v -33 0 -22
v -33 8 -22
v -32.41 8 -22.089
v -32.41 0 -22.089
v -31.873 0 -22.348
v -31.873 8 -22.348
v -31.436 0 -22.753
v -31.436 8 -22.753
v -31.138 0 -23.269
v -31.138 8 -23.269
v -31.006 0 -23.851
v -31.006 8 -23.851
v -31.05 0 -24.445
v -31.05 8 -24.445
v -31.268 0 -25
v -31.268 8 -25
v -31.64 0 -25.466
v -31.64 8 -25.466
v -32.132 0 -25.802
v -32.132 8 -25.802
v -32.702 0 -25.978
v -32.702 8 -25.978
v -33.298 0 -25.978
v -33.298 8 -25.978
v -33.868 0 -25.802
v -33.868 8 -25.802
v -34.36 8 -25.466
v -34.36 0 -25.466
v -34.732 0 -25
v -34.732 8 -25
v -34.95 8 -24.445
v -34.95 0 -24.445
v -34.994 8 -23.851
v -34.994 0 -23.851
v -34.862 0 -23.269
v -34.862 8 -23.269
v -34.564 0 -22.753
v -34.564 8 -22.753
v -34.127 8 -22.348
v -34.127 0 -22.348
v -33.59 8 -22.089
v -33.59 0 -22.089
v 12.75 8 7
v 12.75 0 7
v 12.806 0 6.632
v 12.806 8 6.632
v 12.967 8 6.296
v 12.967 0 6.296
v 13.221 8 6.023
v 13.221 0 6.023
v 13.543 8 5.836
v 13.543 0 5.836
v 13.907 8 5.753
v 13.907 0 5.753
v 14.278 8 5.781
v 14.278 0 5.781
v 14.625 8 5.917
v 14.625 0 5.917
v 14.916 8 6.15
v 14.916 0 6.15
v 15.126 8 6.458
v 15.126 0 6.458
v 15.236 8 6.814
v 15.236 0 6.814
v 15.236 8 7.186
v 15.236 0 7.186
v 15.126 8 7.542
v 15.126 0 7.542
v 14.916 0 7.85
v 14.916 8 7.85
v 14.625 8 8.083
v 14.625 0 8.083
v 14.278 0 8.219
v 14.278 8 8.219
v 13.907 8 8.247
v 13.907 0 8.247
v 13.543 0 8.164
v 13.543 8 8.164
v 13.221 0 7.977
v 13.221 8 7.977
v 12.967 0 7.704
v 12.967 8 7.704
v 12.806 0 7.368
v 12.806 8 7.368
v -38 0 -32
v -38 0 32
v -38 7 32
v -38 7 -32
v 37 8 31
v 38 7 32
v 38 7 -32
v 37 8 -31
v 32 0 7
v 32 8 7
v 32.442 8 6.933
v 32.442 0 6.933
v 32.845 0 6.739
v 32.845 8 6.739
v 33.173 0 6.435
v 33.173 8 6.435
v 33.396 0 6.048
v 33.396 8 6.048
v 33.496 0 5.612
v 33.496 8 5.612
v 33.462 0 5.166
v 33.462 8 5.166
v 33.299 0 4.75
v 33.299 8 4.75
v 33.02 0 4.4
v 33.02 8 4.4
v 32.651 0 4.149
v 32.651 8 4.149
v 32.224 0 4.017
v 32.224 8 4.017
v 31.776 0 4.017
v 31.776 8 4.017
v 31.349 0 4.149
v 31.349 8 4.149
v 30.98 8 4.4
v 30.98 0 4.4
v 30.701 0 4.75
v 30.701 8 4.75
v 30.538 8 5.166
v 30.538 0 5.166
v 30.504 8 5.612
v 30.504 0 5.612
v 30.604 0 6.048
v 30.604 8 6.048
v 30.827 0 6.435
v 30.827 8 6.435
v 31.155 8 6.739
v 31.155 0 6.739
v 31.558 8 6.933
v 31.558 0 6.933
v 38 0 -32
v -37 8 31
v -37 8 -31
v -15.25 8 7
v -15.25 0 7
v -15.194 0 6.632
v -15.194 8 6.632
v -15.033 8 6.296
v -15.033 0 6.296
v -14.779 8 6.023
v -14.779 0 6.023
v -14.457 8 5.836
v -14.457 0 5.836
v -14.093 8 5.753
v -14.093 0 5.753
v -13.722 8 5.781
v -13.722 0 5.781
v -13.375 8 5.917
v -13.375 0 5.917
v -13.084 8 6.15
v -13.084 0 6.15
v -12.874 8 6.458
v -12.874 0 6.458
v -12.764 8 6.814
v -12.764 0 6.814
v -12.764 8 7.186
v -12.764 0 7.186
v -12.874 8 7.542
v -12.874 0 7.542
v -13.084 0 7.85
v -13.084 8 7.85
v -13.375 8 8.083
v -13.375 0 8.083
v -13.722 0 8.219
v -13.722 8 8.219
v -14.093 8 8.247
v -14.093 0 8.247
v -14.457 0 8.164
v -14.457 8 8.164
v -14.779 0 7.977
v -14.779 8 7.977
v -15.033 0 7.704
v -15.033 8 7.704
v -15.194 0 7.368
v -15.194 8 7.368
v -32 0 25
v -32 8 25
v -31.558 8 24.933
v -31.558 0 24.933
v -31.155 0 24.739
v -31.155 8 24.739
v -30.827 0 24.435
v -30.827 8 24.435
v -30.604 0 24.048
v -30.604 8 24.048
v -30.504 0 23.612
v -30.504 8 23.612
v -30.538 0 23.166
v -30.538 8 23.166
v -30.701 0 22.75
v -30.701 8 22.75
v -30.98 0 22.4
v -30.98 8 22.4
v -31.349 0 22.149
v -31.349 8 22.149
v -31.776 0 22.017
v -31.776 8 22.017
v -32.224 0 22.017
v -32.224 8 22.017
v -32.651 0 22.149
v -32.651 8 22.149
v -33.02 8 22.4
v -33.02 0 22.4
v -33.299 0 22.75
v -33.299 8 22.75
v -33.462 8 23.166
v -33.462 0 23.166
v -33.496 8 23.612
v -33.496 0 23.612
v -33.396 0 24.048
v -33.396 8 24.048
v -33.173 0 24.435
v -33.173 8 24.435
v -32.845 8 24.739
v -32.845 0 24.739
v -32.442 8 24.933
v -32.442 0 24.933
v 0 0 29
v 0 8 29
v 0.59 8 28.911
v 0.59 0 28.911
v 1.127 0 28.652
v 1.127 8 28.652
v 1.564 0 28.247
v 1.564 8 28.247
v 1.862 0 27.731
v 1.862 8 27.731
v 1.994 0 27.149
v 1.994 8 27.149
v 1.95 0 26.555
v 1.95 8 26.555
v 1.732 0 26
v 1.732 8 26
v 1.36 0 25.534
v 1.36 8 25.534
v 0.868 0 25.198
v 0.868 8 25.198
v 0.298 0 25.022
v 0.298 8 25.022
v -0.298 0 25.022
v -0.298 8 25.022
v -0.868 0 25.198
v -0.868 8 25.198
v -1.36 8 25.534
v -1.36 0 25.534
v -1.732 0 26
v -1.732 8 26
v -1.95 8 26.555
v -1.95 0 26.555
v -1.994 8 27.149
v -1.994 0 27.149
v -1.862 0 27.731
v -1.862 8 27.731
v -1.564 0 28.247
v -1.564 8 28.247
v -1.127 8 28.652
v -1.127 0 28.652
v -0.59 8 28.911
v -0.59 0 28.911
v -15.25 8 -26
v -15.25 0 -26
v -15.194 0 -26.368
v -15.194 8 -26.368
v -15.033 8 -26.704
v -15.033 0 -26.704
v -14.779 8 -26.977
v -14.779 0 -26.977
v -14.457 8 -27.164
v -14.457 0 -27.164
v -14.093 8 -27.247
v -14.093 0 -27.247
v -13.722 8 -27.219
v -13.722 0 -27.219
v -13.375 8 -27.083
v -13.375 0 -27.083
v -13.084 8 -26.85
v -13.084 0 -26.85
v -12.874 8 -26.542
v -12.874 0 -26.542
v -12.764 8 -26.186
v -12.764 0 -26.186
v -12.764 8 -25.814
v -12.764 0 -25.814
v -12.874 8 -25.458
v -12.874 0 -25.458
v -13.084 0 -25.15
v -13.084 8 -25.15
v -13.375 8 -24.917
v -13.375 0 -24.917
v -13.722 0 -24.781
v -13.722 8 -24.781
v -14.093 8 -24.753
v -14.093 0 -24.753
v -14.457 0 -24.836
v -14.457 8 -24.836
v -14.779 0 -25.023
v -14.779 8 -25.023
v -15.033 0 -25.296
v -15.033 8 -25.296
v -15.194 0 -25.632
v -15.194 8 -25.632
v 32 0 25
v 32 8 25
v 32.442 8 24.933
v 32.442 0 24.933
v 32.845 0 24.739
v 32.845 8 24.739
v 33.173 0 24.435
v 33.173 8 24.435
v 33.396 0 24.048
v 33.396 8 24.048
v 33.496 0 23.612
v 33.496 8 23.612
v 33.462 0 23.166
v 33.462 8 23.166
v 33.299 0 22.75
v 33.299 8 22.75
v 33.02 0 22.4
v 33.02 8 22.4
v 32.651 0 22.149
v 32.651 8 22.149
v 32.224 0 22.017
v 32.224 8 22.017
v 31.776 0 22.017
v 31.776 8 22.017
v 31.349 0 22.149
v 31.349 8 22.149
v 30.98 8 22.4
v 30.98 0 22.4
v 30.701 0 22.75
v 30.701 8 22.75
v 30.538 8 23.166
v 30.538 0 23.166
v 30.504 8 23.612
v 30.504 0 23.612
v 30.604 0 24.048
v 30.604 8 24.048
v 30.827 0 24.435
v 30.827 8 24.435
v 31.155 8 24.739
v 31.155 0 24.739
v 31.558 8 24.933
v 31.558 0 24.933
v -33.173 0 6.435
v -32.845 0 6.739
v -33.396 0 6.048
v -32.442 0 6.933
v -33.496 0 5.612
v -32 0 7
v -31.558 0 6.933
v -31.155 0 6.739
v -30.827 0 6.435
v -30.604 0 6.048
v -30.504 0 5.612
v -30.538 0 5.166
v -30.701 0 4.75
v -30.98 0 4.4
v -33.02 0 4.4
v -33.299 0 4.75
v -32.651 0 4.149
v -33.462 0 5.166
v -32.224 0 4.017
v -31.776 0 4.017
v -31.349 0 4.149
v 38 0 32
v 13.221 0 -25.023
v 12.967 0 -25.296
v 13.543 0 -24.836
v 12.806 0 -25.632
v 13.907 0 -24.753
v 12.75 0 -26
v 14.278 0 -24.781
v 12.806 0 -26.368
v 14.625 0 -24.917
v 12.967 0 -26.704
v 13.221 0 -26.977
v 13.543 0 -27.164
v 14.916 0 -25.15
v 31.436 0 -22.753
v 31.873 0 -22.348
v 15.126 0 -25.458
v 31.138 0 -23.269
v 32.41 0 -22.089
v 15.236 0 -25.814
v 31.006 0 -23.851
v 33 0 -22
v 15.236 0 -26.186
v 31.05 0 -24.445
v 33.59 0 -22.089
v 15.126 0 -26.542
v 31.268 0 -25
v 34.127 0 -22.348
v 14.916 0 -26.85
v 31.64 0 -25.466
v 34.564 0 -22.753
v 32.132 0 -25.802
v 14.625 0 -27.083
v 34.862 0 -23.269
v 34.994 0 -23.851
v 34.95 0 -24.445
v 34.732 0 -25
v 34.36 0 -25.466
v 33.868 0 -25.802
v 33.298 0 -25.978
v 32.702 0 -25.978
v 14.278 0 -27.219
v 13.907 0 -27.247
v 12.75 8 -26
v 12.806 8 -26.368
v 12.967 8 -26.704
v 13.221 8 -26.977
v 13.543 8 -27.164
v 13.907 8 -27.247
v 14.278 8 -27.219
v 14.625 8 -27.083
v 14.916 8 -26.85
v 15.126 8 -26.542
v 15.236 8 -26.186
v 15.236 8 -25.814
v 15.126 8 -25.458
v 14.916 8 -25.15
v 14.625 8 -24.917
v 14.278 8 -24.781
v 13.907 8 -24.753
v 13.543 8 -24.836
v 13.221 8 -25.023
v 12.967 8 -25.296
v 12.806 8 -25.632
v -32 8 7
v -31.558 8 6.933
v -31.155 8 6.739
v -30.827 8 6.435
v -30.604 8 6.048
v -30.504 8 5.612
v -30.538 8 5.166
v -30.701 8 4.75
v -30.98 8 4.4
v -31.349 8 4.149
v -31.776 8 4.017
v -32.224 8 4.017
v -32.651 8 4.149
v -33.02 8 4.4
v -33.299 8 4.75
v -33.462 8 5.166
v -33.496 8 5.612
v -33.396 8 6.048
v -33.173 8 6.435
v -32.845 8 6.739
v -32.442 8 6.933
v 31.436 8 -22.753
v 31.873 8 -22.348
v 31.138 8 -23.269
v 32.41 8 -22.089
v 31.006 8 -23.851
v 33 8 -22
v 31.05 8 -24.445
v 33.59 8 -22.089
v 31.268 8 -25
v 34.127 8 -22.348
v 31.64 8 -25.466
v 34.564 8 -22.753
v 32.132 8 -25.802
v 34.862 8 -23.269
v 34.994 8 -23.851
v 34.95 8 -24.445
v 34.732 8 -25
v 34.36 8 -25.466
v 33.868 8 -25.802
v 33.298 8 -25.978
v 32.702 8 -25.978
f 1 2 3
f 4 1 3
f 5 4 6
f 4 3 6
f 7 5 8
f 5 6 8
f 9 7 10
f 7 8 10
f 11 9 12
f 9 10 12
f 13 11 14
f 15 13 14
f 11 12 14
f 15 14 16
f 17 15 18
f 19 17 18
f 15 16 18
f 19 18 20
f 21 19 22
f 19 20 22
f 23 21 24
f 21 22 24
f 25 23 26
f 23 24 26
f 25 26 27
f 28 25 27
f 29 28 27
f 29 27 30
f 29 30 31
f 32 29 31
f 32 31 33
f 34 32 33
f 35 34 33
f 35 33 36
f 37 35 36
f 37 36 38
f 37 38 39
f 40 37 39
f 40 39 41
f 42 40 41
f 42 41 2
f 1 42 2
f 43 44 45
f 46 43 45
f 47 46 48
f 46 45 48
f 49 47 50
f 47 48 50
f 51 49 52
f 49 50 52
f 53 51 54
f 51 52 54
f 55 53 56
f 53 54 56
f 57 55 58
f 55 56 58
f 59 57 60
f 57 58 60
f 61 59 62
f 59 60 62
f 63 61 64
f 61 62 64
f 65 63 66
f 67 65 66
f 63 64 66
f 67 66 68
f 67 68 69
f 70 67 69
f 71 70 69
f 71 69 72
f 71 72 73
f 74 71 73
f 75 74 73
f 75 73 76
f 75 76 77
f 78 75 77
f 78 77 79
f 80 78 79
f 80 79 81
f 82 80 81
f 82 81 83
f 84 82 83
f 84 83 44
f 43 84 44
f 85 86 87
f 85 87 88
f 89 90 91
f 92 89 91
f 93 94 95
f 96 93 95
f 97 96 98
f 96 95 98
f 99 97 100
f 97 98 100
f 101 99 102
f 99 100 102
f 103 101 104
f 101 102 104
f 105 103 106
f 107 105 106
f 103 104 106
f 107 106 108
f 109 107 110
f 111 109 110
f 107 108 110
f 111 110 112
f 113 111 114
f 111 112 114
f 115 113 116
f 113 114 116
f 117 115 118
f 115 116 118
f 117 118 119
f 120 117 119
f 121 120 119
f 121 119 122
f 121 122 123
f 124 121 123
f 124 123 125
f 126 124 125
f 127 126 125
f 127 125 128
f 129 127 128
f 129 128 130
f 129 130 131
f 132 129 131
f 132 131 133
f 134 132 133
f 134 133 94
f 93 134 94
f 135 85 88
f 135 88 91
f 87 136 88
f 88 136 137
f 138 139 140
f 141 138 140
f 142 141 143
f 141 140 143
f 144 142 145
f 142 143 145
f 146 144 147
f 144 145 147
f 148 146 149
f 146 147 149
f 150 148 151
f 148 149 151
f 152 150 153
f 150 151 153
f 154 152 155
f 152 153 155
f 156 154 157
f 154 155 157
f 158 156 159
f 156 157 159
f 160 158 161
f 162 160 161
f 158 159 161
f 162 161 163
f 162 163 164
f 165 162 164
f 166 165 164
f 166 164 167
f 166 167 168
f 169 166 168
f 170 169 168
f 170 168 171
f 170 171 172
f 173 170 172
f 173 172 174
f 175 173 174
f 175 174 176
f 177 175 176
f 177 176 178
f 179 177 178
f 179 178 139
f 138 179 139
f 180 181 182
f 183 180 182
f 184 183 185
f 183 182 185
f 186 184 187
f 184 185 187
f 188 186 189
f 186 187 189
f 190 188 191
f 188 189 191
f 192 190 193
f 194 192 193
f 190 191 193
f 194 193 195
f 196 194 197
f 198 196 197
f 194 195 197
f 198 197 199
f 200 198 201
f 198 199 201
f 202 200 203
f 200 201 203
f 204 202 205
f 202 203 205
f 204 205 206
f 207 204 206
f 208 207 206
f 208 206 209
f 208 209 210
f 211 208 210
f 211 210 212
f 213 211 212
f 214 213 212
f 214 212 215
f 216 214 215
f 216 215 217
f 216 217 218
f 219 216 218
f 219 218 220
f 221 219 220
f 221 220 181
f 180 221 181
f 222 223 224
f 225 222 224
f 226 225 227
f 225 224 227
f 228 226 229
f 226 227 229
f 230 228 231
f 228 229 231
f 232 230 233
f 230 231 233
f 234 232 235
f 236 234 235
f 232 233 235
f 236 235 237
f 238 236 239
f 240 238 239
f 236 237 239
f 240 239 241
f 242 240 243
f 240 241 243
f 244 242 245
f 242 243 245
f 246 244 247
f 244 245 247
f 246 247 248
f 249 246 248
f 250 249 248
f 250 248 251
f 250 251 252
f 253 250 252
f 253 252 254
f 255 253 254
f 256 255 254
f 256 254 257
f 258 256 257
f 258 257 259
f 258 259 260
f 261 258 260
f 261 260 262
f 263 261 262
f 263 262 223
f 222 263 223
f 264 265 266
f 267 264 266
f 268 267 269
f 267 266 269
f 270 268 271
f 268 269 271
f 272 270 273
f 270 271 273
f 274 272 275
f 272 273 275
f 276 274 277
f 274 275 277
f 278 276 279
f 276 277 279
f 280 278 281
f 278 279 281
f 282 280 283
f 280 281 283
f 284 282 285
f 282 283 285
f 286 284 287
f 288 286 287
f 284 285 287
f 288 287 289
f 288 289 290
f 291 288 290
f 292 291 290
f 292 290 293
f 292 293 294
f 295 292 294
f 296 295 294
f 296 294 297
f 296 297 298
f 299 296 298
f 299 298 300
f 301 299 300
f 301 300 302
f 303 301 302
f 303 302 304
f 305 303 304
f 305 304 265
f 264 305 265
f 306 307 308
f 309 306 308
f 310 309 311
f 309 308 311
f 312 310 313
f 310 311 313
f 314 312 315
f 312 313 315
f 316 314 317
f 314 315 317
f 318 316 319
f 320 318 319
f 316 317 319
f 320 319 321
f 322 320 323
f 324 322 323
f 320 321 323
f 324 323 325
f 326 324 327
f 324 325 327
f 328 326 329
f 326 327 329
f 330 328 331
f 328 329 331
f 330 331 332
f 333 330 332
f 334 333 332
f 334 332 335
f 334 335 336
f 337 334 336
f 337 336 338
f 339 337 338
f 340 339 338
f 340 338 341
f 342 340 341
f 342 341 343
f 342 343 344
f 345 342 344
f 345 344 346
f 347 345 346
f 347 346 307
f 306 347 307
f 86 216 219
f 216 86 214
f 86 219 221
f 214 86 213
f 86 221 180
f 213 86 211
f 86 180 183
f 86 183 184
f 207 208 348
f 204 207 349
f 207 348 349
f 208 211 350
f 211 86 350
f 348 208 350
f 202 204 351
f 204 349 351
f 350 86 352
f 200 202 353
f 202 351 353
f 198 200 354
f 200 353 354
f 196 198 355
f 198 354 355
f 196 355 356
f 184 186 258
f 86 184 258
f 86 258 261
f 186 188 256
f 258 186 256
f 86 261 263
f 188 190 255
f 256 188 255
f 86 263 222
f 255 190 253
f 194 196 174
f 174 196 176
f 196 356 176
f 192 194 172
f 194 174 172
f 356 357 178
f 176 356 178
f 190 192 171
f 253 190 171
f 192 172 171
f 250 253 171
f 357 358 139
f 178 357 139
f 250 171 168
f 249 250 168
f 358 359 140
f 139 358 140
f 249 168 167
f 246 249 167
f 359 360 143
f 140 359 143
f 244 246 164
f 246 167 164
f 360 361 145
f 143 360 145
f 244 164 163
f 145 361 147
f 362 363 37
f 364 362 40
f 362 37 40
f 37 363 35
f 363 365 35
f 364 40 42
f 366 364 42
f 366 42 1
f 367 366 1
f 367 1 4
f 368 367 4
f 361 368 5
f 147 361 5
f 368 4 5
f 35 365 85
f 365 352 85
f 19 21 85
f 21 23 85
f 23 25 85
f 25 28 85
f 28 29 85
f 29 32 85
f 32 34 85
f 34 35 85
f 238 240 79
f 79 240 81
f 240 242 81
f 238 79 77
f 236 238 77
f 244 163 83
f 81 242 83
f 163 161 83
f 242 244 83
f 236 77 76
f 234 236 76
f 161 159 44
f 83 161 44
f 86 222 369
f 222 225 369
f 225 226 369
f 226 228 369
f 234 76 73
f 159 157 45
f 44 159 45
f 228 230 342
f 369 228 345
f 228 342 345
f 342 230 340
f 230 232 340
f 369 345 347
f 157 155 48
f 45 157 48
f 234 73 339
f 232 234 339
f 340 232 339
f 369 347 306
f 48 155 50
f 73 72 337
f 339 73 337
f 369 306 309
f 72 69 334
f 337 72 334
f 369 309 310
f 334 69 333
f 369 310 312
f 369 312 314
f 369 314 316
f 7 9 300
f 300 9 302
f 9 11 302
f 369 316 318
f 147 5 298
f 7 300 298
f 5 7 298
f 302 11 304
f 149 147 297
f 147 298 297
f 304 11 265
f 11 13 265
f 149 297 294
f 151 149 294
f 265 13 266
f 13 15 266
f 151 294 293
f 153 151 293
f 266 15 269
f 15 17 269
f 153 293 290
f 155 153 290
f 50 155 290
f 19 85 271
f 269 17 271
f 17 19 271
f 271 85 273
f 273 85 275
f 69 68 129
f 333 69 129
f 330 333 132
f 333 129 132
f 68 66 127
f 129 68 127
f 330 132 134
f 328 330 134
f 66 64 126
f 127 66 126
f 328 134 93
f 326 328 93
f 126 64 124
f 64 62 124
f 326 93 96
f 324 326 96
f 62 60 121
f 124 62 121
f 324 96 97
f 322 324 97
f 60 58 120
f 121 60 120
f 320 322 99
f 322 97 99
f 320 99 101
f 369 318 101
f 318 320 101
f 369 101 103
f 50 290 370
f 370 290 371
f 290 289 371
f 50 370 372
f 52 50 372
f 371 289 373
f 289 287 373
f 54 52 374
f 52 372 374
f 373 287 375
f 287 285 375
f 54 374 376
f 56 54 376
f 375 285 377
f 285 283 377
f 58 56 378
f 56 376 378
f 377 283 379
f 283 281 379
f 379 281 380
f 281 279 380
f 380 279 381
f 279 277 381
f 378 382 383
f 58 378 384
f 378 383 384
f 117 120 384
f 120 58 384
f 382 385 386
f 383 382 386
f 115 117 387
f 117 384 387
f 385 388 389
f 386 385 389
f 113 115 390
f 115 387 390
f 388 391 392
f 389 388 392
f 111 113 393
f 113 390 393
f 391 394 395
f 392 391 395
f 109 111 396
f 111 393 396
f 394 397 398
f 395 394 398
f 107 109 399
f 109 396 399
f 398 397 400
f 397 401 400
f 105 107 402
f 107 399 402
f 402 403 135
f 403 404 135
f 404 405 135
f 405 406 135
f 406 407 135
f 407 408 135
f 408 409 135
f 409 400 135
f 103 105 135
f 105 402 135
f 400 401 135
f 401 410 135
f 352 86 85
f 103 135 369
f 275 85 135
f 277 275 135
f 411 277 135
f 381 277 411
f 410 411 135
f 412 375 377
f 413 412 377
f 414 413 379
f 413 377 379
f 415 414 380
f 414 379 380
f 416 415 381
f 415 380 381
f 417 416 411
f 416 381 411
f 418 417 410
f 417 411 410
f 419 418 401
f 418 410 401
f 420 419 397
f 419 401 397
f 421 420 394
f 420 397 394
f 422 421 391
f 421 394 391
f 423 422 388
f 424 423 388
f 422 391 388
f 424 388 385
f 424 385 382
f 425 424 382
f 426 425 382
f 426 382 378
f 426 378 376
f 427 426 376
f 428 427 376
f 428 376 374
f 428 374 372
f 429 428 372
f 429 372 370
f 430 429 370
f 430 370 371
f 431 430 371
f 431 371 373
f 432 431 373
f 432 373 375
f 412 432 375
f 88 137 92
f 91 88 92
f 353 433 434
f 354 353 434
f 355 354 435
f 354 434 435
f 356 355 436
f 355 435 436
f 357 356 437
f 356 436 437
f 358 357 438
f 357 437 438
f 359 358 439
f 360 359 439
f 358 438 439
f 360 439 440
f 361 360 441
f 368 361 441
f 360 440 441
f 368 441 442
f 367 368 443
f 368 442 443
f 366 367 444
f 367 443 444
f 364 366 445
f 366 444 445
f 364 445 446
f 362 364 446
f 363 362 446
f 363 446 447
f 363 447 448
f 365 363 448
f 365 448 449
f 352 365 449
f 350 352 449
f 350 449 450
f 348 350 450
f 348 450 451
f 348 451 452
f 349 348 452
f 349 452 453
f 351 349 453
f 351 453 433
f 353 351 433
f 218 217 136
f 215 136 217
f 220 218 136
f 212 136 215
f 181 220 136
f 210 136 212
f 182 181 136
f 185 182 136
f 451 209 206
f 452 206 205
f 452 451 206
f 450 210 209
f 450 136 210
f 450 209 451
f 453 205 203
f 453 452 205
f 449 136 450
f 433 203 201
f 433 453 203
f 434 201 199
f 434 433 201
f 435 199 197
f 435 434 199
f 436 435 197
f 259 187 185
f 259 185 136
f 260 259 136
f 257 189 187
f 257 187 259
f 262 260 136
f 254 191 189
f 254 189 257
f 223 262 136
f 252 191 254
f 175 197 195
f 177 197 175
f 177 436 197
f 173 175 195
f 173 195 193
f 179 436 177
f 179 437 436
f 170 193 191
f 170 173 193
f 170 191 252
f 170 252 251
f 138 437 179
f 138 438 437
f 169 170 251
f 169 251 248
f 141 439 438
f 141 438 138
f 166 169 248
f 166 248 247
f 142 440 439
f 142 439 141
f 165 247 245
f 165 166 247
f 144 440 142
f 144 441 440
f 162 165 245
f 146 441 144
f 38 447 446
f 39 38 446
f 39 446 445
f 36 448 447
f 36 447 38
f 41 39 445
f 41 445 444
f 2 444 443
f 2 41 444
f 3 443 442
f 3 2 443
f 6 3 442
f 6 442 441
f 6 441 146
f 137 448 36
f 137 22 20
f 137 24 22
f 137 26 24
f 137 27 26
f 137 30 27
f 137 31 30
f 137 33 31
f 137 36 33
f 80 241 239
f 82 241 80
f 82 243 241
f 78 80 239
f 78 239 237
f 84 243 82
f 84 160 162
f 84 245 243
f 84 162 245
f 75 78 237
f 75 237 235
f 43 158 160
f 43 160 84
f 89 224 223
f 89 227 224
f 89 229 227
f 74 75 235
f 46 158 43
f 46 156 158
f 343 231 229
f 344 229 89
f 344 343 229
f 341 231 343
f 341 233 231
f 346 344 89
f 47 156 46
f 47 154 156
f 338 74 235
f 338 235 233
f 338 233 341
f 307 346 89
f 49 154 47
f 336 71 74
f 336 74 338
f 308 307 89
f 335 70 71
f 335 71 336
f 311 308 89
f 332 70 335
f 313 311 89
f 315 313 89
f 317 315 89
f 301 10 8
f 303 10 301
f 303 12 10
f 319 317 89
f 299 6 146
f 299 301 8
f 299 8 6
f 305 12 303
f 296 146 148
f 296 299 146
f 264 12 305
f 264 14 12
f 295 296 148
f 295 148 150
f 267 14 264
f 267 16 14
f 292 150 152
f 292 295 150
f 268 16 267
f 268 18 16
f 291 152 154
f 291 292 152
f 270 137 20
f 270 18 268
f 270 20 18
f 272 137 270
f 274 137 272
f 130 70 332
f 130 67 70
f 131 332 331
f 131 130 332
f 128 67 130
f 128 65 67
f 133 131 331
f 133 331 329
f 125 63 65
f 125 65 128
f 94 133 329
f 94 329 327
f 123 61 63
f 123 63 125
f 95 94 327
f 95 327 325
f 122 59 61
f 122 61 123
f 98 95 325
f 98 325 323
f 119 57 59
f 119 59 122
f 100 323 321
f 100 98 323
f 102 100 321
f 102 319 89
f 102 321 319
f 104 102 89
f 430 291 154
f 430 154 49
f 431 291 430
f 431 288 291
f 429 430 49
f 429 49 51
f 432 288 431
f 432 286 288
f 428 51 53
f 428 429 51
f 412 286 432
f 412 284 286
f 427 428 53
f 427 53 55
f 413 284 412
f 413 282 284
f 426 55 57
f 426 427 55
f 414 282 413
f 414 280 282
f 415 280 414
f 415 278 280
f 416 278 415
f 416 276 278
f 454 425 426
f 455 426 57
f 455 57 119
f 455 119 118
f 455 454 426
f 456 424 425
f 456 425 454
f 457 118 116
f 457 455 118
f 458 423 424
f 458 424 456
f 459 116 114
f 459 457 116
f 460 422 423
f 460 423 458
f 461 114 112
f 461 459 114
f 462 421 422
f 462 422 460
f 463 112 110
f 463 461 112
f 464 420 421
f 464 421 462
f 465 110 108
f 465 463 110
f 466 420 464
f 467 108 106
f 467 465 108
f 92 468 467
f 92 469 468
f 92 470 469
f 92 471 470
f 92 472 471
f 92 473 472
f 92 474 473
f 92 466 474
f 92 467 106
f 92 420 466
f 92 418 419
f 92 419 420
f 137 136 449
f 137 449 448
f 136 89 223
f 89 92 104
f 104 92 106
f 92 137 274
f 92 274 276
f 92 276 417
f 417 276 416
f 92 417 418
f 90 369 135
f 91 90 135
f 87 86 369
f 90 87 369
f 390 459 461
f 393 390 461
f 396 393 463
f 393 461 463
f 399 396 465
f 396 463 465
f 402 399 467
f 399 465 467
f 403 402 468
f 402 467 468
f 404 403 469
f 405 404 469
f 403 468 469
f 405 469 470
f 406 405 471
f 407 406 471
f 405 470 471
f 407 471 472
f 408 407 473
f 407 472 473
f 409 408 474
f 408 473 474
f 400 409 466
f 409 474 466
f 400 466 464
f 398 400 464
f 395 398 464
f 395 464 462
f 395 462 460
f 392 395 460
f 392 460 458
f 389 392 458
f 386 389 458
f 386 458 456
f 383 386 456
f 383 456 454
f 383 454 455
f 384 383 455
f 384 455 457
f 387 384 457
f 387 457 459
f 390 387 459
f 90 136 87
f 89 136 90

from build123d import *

# Parameters (mm, degrees)
SKETCH1_W            = 76
SKETCH1_H            = 64
BOSS_EXTRUDE1_DEPTH  = 8
M3_TAPPED_HOLE1_D    = 2.5
LPATTERN2_COUNT      = 2
LPATTERN2_PITCH      = 28
LPATTERN2_COUNT_DIR2 = 2
LPATTERN2_PITCH_DIR2 = 33
SKETCH5_R            = 2
CUT_EXTRUDE1_DEPTH   = 51.318982502
CHAMFER1_SIZE        = 1
SKETCH6_R            = 1.5
CUT_EXTRUDE2_DEPTH   = 10


with BuildPart() as part:
    # Sketch1 → Boss-Extrude1 (new body)
    with BuildSketch(Plane(origin=(0, 0, 0), x_dir=(1, 0, 0), z_dir=(0, 1, 0))):
        Rectangle(SKETCH1_W, SKETCH1_H)
    extrude(amount=BOSS_EXTRUDE1_DEPTH)

    # M3 Tapped Hole1 (through all)
    with Locations(Plane(origin=(0, 8, 0), x_dir=(1, 0, 0), z_dir=(0, 1, 0))):
        with Locations((-14, 26)):
            m3_tapped_hole1 = Hole(M3_TAPPED_HOLE1_D / 2)

    # LPattern2: M3 Tapped Hole1 2 × 2
    with Locations(*[(i * LPATTERN2_PITCH, 0, j * LPATTERN2_PITCH_DIR2) for i in range(LPATTERN2_COUNT) for j in range(LPATTERN2_COUNT_DIR2) if (i, j) != (0, 0)]):
        add(m3_tapped_hole1, mode=Mode.SUBTRACT)

    # Sketch5 → Cut-Extrude1 (cut, through all)
    with BuildSketch(Plane(origin=(0, 8, 0), x_dir=(1, 0, 0), z_dir=(0, 1, 0))):
        with Locations(Location((-33, 24, 0), (0, 0, 270))):
            Circle(SKETCH5_R)
        with Locations(Location((33, 24, 0), (0, 0, 270))):
            Circle(SKETCH5_R)
        with Locations(Location((0, -27, 0), (0, 0, 270))):
            Circle(SKETCH5_R)
    extrude(amount=-CUT_EXTRUDE1_DEPTH, mode=Mode.SUBTRACT)

    # Chamfer1
    chamfer1_edges = [part.edges().sort_by_distance(p)[0] for p in [
        (-38, 8, 0),
        (0, 8, 32),
        (38, 8, 0),
        (0, 8, -32),
    ]]
    chamfer(chamfer1_edges, length=CHAMFER1_SIZE)

    # Sketch6 → Cut-Extrude2 (cut)
    with BuildSketch(Plane(origin=(0, 8, 0), x_dir=(1, 0, 0), z_dir=(0, 1, 0))):
        with Locations(Location((32, -5.5, 0), (0, 0, 270))):
            Circle(SKETCH6_R)
        with Locations(Location((32, -23.5, 0), (0, 0, 270))):
            Circle(SKETCH6_R)
        with Locations(Location((-32, -23.5, 0), (0, 0, 270))):
            Circle(SKETCH6_R)
        with Locations(Location((-32, -5.5, 0), (0, 0, 270))):
            Circle(SKETCH6_R)
    extrude(amount=-CUT_EXTRUDE2_DEPTH, mode=Mode.SUBTRACT)


solid = part.part
